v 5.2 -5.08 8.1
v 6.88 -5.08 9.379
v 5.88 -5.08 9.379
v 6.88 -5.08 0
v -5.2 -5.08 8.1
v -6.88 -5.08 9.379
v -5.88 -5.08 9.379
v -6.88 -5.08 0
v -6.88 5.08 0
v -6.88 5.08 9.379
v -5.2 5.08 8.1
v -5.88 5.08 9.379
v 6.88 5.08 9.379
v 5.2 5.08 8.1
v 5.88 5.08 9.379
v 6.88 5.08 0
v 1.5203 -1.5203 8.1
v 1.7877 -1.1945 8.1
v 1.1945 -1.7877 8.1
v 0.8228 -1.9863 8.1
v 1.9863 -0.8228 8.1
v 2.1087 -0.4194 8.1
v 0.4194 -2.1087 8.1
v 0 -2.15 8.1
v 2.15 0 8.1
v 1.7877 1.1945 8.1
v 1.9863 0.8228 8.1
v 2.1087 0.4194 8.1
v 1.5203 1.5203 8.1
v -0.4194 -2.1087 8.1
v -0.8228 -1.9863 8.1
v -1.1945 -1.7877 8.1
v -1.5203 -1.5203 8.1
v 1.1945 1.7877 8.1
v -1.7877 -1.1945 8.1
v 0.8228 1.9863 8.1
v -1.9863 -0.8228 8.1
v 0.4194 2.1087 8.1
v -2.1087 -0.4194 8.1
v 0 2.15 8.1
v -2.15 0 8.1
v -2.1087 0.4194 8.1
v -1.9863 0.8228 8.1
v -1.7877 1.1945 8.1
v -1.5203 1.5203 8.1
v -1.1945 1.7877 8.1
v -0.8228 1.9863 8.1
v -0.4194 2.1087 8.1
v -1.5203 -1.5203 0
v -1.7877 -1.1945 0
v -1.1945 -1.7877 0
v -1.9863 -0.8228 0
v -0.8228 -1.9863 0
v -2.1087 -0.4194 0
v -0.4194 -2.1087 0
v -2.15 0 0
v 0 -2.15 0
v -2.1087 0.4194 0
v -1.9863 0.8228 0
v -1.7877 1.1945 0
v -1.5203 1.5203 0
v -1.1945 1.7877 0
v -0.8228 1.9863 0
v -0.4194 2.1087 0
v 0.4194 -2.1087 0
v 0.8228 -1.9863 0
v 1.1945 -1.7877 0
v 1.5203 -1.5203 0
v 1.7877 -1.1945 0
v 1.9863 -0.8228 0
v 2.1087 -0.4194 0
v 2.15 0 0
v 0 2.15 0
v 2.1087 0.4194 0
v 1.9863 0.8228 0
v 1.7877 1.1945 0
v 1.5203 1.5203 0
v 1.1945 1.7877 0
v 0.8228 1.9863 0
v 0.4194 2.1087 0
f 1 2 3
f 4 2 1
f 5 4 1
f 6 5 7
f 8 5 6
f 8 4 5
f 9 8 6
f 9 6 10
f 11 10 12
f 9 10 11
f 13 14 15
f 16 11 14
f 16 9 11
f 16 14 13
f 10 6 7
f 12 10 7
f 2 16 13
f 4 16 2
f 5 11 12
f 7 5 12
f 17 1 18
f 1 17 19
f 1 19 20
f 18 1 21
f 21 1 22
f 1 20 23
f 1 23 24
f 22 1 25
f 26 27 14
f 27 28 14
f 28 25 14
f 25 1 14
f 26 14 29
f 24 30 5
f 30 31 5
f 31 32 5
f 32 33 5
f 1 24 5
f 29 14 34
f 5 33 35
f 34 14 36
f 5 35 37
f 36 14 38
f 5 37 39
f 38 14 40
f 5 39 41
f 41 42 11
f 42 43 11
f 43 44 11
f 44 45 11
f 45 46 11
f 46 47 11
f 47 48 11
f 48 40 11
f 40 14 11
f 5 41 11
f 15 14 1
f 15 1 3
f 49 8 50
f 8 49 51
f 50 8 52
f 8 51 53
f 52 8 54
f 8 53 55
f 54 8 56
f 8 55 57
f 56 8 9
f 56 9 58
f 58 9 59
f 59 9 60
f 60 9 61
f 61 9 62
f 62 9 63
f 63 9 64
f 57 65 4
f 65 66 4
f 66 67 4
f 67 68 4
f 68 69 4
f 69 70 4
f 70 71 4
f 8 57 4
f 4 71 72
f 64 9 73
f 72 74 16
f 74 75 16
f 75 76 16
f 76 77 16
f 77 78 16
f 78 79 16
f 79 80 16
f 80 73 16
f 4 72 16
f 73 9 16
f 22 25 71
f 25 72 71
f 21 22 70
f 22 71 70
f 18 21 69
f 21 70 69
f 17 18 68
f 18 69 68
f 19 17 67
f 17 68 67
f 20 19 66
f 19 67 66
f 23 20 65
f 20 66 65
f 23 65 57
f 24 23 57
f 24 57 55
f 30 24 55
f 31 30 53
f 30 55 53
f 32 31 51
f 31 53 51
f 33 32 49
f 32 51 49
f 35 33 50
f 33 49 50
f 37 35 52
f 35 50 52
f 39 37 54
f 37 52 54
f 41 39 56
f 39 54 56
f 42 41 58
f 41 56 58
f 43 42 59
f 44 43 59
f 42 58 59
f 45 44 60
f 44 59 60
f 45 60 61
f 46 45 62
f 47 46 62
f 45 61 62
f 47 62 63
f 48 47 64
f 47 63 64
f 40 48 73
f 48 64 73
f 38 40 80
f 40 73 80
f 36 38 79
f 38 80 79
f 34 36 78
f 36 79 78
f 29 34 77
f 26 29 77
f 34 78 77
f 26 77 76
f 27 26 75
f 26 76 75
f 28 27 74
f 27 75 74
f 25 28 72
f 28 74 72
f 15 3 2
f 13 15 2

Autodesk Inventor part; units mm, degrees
ref_plane "YZ Plane" through (0, 0, 0) normal (1, 0, 0) x (0, 1, 0)
ref_plane "XZ Plane" through (0, 0, 0) normal (0, 1, 0) x (-1, 0, 0)
ref_plane "XY Plane" through (0, 0, 0) normal (0, 0, 1) x (1, 0, 0)
sketch "Sketch1" plane through (0, 0, 0) normal (0, 0, 1) x (1, 0, 0)
  line L0 (6.88, -5.08) -> (-6.88, -5.08)
  line L1 (-6.88, -5.08) -> (-6.88, 5.08)
  line L2 (-6.88, 5.08) -> (6.88, 5.08)
  line L3 (6.88, 5.08) -> (6.88, -5.08)
  line L4 (6.88, -5.08) -> (-6.88, 5.08) construction
  line L5 (-6.88, -5.08) -> (6.88, 5.08) construction
  circle A0 centre (0, 0) radius 3.6
  circle A1 centre (0, 0) radius 2.15
  line L6 (6.88, 0) -> (-6.88, 0)
  line L7 (0, 5.08) -> (0, -5.08)
  dimension "d0" = 13.76
  dimension "d1" = 10.16
  dimension "d2" = 7.2
  dimension "d3" = 4.3
extrude "Extrusion1" add sketch "Sketch1" along normal blind 9.379 contours L0 L7 A0 L6 L3 | L0 L1 L6 A0 L7 | L6 A0 L7 L2 L3 | L7 A1 L6 A0 | A0 L6 A1 L7 | L6 A1 L7 A0 | L1 L2 L7 A0 L6 | A0 L7 A1 L6
sketch "Sketch2" plane through (-6.88, 5.08, 0) normal (0, 1, 0) x (-1, 0, 0)
  line L0 (-12.08, 8.1) -> (-1.68, 8.1)
  line L1 (-6.88, 8.1) -> (-6.88, 9.379) construction
  line L2 (-13.76, 9.379) -> (0, 9.379) construction
  line L3 (-13.76, 9.379) -> (-12.76, 9.379)
  line L4 (0, 9.379) -> (-1, 9.379)
  line L5 (-12.08, 8.1) -> (-12.76, 9.379)
  line L6 (-1.68, 8.1) -> (-1, 9.379)
  line L7 (-13.76, 9.379) -> (-13.76, 11.379)
  line L8 (-13.76, 11.379) -> (0, 11.379)
  line L9 (0, 0) -> (0, 9.379) construction
  line L10 (0, 11.379) -> (0, 9.379)
  dimension "d6" = 10.4
  dimension "d19" = 1.279
  dimension "d20" = 1
  dimension "d21" = 1
  dimension "d22" = 2
extrude "Extrusion2" cut sketch "Sketch2" against normal up to next
properties part number "base_thorlabs"
